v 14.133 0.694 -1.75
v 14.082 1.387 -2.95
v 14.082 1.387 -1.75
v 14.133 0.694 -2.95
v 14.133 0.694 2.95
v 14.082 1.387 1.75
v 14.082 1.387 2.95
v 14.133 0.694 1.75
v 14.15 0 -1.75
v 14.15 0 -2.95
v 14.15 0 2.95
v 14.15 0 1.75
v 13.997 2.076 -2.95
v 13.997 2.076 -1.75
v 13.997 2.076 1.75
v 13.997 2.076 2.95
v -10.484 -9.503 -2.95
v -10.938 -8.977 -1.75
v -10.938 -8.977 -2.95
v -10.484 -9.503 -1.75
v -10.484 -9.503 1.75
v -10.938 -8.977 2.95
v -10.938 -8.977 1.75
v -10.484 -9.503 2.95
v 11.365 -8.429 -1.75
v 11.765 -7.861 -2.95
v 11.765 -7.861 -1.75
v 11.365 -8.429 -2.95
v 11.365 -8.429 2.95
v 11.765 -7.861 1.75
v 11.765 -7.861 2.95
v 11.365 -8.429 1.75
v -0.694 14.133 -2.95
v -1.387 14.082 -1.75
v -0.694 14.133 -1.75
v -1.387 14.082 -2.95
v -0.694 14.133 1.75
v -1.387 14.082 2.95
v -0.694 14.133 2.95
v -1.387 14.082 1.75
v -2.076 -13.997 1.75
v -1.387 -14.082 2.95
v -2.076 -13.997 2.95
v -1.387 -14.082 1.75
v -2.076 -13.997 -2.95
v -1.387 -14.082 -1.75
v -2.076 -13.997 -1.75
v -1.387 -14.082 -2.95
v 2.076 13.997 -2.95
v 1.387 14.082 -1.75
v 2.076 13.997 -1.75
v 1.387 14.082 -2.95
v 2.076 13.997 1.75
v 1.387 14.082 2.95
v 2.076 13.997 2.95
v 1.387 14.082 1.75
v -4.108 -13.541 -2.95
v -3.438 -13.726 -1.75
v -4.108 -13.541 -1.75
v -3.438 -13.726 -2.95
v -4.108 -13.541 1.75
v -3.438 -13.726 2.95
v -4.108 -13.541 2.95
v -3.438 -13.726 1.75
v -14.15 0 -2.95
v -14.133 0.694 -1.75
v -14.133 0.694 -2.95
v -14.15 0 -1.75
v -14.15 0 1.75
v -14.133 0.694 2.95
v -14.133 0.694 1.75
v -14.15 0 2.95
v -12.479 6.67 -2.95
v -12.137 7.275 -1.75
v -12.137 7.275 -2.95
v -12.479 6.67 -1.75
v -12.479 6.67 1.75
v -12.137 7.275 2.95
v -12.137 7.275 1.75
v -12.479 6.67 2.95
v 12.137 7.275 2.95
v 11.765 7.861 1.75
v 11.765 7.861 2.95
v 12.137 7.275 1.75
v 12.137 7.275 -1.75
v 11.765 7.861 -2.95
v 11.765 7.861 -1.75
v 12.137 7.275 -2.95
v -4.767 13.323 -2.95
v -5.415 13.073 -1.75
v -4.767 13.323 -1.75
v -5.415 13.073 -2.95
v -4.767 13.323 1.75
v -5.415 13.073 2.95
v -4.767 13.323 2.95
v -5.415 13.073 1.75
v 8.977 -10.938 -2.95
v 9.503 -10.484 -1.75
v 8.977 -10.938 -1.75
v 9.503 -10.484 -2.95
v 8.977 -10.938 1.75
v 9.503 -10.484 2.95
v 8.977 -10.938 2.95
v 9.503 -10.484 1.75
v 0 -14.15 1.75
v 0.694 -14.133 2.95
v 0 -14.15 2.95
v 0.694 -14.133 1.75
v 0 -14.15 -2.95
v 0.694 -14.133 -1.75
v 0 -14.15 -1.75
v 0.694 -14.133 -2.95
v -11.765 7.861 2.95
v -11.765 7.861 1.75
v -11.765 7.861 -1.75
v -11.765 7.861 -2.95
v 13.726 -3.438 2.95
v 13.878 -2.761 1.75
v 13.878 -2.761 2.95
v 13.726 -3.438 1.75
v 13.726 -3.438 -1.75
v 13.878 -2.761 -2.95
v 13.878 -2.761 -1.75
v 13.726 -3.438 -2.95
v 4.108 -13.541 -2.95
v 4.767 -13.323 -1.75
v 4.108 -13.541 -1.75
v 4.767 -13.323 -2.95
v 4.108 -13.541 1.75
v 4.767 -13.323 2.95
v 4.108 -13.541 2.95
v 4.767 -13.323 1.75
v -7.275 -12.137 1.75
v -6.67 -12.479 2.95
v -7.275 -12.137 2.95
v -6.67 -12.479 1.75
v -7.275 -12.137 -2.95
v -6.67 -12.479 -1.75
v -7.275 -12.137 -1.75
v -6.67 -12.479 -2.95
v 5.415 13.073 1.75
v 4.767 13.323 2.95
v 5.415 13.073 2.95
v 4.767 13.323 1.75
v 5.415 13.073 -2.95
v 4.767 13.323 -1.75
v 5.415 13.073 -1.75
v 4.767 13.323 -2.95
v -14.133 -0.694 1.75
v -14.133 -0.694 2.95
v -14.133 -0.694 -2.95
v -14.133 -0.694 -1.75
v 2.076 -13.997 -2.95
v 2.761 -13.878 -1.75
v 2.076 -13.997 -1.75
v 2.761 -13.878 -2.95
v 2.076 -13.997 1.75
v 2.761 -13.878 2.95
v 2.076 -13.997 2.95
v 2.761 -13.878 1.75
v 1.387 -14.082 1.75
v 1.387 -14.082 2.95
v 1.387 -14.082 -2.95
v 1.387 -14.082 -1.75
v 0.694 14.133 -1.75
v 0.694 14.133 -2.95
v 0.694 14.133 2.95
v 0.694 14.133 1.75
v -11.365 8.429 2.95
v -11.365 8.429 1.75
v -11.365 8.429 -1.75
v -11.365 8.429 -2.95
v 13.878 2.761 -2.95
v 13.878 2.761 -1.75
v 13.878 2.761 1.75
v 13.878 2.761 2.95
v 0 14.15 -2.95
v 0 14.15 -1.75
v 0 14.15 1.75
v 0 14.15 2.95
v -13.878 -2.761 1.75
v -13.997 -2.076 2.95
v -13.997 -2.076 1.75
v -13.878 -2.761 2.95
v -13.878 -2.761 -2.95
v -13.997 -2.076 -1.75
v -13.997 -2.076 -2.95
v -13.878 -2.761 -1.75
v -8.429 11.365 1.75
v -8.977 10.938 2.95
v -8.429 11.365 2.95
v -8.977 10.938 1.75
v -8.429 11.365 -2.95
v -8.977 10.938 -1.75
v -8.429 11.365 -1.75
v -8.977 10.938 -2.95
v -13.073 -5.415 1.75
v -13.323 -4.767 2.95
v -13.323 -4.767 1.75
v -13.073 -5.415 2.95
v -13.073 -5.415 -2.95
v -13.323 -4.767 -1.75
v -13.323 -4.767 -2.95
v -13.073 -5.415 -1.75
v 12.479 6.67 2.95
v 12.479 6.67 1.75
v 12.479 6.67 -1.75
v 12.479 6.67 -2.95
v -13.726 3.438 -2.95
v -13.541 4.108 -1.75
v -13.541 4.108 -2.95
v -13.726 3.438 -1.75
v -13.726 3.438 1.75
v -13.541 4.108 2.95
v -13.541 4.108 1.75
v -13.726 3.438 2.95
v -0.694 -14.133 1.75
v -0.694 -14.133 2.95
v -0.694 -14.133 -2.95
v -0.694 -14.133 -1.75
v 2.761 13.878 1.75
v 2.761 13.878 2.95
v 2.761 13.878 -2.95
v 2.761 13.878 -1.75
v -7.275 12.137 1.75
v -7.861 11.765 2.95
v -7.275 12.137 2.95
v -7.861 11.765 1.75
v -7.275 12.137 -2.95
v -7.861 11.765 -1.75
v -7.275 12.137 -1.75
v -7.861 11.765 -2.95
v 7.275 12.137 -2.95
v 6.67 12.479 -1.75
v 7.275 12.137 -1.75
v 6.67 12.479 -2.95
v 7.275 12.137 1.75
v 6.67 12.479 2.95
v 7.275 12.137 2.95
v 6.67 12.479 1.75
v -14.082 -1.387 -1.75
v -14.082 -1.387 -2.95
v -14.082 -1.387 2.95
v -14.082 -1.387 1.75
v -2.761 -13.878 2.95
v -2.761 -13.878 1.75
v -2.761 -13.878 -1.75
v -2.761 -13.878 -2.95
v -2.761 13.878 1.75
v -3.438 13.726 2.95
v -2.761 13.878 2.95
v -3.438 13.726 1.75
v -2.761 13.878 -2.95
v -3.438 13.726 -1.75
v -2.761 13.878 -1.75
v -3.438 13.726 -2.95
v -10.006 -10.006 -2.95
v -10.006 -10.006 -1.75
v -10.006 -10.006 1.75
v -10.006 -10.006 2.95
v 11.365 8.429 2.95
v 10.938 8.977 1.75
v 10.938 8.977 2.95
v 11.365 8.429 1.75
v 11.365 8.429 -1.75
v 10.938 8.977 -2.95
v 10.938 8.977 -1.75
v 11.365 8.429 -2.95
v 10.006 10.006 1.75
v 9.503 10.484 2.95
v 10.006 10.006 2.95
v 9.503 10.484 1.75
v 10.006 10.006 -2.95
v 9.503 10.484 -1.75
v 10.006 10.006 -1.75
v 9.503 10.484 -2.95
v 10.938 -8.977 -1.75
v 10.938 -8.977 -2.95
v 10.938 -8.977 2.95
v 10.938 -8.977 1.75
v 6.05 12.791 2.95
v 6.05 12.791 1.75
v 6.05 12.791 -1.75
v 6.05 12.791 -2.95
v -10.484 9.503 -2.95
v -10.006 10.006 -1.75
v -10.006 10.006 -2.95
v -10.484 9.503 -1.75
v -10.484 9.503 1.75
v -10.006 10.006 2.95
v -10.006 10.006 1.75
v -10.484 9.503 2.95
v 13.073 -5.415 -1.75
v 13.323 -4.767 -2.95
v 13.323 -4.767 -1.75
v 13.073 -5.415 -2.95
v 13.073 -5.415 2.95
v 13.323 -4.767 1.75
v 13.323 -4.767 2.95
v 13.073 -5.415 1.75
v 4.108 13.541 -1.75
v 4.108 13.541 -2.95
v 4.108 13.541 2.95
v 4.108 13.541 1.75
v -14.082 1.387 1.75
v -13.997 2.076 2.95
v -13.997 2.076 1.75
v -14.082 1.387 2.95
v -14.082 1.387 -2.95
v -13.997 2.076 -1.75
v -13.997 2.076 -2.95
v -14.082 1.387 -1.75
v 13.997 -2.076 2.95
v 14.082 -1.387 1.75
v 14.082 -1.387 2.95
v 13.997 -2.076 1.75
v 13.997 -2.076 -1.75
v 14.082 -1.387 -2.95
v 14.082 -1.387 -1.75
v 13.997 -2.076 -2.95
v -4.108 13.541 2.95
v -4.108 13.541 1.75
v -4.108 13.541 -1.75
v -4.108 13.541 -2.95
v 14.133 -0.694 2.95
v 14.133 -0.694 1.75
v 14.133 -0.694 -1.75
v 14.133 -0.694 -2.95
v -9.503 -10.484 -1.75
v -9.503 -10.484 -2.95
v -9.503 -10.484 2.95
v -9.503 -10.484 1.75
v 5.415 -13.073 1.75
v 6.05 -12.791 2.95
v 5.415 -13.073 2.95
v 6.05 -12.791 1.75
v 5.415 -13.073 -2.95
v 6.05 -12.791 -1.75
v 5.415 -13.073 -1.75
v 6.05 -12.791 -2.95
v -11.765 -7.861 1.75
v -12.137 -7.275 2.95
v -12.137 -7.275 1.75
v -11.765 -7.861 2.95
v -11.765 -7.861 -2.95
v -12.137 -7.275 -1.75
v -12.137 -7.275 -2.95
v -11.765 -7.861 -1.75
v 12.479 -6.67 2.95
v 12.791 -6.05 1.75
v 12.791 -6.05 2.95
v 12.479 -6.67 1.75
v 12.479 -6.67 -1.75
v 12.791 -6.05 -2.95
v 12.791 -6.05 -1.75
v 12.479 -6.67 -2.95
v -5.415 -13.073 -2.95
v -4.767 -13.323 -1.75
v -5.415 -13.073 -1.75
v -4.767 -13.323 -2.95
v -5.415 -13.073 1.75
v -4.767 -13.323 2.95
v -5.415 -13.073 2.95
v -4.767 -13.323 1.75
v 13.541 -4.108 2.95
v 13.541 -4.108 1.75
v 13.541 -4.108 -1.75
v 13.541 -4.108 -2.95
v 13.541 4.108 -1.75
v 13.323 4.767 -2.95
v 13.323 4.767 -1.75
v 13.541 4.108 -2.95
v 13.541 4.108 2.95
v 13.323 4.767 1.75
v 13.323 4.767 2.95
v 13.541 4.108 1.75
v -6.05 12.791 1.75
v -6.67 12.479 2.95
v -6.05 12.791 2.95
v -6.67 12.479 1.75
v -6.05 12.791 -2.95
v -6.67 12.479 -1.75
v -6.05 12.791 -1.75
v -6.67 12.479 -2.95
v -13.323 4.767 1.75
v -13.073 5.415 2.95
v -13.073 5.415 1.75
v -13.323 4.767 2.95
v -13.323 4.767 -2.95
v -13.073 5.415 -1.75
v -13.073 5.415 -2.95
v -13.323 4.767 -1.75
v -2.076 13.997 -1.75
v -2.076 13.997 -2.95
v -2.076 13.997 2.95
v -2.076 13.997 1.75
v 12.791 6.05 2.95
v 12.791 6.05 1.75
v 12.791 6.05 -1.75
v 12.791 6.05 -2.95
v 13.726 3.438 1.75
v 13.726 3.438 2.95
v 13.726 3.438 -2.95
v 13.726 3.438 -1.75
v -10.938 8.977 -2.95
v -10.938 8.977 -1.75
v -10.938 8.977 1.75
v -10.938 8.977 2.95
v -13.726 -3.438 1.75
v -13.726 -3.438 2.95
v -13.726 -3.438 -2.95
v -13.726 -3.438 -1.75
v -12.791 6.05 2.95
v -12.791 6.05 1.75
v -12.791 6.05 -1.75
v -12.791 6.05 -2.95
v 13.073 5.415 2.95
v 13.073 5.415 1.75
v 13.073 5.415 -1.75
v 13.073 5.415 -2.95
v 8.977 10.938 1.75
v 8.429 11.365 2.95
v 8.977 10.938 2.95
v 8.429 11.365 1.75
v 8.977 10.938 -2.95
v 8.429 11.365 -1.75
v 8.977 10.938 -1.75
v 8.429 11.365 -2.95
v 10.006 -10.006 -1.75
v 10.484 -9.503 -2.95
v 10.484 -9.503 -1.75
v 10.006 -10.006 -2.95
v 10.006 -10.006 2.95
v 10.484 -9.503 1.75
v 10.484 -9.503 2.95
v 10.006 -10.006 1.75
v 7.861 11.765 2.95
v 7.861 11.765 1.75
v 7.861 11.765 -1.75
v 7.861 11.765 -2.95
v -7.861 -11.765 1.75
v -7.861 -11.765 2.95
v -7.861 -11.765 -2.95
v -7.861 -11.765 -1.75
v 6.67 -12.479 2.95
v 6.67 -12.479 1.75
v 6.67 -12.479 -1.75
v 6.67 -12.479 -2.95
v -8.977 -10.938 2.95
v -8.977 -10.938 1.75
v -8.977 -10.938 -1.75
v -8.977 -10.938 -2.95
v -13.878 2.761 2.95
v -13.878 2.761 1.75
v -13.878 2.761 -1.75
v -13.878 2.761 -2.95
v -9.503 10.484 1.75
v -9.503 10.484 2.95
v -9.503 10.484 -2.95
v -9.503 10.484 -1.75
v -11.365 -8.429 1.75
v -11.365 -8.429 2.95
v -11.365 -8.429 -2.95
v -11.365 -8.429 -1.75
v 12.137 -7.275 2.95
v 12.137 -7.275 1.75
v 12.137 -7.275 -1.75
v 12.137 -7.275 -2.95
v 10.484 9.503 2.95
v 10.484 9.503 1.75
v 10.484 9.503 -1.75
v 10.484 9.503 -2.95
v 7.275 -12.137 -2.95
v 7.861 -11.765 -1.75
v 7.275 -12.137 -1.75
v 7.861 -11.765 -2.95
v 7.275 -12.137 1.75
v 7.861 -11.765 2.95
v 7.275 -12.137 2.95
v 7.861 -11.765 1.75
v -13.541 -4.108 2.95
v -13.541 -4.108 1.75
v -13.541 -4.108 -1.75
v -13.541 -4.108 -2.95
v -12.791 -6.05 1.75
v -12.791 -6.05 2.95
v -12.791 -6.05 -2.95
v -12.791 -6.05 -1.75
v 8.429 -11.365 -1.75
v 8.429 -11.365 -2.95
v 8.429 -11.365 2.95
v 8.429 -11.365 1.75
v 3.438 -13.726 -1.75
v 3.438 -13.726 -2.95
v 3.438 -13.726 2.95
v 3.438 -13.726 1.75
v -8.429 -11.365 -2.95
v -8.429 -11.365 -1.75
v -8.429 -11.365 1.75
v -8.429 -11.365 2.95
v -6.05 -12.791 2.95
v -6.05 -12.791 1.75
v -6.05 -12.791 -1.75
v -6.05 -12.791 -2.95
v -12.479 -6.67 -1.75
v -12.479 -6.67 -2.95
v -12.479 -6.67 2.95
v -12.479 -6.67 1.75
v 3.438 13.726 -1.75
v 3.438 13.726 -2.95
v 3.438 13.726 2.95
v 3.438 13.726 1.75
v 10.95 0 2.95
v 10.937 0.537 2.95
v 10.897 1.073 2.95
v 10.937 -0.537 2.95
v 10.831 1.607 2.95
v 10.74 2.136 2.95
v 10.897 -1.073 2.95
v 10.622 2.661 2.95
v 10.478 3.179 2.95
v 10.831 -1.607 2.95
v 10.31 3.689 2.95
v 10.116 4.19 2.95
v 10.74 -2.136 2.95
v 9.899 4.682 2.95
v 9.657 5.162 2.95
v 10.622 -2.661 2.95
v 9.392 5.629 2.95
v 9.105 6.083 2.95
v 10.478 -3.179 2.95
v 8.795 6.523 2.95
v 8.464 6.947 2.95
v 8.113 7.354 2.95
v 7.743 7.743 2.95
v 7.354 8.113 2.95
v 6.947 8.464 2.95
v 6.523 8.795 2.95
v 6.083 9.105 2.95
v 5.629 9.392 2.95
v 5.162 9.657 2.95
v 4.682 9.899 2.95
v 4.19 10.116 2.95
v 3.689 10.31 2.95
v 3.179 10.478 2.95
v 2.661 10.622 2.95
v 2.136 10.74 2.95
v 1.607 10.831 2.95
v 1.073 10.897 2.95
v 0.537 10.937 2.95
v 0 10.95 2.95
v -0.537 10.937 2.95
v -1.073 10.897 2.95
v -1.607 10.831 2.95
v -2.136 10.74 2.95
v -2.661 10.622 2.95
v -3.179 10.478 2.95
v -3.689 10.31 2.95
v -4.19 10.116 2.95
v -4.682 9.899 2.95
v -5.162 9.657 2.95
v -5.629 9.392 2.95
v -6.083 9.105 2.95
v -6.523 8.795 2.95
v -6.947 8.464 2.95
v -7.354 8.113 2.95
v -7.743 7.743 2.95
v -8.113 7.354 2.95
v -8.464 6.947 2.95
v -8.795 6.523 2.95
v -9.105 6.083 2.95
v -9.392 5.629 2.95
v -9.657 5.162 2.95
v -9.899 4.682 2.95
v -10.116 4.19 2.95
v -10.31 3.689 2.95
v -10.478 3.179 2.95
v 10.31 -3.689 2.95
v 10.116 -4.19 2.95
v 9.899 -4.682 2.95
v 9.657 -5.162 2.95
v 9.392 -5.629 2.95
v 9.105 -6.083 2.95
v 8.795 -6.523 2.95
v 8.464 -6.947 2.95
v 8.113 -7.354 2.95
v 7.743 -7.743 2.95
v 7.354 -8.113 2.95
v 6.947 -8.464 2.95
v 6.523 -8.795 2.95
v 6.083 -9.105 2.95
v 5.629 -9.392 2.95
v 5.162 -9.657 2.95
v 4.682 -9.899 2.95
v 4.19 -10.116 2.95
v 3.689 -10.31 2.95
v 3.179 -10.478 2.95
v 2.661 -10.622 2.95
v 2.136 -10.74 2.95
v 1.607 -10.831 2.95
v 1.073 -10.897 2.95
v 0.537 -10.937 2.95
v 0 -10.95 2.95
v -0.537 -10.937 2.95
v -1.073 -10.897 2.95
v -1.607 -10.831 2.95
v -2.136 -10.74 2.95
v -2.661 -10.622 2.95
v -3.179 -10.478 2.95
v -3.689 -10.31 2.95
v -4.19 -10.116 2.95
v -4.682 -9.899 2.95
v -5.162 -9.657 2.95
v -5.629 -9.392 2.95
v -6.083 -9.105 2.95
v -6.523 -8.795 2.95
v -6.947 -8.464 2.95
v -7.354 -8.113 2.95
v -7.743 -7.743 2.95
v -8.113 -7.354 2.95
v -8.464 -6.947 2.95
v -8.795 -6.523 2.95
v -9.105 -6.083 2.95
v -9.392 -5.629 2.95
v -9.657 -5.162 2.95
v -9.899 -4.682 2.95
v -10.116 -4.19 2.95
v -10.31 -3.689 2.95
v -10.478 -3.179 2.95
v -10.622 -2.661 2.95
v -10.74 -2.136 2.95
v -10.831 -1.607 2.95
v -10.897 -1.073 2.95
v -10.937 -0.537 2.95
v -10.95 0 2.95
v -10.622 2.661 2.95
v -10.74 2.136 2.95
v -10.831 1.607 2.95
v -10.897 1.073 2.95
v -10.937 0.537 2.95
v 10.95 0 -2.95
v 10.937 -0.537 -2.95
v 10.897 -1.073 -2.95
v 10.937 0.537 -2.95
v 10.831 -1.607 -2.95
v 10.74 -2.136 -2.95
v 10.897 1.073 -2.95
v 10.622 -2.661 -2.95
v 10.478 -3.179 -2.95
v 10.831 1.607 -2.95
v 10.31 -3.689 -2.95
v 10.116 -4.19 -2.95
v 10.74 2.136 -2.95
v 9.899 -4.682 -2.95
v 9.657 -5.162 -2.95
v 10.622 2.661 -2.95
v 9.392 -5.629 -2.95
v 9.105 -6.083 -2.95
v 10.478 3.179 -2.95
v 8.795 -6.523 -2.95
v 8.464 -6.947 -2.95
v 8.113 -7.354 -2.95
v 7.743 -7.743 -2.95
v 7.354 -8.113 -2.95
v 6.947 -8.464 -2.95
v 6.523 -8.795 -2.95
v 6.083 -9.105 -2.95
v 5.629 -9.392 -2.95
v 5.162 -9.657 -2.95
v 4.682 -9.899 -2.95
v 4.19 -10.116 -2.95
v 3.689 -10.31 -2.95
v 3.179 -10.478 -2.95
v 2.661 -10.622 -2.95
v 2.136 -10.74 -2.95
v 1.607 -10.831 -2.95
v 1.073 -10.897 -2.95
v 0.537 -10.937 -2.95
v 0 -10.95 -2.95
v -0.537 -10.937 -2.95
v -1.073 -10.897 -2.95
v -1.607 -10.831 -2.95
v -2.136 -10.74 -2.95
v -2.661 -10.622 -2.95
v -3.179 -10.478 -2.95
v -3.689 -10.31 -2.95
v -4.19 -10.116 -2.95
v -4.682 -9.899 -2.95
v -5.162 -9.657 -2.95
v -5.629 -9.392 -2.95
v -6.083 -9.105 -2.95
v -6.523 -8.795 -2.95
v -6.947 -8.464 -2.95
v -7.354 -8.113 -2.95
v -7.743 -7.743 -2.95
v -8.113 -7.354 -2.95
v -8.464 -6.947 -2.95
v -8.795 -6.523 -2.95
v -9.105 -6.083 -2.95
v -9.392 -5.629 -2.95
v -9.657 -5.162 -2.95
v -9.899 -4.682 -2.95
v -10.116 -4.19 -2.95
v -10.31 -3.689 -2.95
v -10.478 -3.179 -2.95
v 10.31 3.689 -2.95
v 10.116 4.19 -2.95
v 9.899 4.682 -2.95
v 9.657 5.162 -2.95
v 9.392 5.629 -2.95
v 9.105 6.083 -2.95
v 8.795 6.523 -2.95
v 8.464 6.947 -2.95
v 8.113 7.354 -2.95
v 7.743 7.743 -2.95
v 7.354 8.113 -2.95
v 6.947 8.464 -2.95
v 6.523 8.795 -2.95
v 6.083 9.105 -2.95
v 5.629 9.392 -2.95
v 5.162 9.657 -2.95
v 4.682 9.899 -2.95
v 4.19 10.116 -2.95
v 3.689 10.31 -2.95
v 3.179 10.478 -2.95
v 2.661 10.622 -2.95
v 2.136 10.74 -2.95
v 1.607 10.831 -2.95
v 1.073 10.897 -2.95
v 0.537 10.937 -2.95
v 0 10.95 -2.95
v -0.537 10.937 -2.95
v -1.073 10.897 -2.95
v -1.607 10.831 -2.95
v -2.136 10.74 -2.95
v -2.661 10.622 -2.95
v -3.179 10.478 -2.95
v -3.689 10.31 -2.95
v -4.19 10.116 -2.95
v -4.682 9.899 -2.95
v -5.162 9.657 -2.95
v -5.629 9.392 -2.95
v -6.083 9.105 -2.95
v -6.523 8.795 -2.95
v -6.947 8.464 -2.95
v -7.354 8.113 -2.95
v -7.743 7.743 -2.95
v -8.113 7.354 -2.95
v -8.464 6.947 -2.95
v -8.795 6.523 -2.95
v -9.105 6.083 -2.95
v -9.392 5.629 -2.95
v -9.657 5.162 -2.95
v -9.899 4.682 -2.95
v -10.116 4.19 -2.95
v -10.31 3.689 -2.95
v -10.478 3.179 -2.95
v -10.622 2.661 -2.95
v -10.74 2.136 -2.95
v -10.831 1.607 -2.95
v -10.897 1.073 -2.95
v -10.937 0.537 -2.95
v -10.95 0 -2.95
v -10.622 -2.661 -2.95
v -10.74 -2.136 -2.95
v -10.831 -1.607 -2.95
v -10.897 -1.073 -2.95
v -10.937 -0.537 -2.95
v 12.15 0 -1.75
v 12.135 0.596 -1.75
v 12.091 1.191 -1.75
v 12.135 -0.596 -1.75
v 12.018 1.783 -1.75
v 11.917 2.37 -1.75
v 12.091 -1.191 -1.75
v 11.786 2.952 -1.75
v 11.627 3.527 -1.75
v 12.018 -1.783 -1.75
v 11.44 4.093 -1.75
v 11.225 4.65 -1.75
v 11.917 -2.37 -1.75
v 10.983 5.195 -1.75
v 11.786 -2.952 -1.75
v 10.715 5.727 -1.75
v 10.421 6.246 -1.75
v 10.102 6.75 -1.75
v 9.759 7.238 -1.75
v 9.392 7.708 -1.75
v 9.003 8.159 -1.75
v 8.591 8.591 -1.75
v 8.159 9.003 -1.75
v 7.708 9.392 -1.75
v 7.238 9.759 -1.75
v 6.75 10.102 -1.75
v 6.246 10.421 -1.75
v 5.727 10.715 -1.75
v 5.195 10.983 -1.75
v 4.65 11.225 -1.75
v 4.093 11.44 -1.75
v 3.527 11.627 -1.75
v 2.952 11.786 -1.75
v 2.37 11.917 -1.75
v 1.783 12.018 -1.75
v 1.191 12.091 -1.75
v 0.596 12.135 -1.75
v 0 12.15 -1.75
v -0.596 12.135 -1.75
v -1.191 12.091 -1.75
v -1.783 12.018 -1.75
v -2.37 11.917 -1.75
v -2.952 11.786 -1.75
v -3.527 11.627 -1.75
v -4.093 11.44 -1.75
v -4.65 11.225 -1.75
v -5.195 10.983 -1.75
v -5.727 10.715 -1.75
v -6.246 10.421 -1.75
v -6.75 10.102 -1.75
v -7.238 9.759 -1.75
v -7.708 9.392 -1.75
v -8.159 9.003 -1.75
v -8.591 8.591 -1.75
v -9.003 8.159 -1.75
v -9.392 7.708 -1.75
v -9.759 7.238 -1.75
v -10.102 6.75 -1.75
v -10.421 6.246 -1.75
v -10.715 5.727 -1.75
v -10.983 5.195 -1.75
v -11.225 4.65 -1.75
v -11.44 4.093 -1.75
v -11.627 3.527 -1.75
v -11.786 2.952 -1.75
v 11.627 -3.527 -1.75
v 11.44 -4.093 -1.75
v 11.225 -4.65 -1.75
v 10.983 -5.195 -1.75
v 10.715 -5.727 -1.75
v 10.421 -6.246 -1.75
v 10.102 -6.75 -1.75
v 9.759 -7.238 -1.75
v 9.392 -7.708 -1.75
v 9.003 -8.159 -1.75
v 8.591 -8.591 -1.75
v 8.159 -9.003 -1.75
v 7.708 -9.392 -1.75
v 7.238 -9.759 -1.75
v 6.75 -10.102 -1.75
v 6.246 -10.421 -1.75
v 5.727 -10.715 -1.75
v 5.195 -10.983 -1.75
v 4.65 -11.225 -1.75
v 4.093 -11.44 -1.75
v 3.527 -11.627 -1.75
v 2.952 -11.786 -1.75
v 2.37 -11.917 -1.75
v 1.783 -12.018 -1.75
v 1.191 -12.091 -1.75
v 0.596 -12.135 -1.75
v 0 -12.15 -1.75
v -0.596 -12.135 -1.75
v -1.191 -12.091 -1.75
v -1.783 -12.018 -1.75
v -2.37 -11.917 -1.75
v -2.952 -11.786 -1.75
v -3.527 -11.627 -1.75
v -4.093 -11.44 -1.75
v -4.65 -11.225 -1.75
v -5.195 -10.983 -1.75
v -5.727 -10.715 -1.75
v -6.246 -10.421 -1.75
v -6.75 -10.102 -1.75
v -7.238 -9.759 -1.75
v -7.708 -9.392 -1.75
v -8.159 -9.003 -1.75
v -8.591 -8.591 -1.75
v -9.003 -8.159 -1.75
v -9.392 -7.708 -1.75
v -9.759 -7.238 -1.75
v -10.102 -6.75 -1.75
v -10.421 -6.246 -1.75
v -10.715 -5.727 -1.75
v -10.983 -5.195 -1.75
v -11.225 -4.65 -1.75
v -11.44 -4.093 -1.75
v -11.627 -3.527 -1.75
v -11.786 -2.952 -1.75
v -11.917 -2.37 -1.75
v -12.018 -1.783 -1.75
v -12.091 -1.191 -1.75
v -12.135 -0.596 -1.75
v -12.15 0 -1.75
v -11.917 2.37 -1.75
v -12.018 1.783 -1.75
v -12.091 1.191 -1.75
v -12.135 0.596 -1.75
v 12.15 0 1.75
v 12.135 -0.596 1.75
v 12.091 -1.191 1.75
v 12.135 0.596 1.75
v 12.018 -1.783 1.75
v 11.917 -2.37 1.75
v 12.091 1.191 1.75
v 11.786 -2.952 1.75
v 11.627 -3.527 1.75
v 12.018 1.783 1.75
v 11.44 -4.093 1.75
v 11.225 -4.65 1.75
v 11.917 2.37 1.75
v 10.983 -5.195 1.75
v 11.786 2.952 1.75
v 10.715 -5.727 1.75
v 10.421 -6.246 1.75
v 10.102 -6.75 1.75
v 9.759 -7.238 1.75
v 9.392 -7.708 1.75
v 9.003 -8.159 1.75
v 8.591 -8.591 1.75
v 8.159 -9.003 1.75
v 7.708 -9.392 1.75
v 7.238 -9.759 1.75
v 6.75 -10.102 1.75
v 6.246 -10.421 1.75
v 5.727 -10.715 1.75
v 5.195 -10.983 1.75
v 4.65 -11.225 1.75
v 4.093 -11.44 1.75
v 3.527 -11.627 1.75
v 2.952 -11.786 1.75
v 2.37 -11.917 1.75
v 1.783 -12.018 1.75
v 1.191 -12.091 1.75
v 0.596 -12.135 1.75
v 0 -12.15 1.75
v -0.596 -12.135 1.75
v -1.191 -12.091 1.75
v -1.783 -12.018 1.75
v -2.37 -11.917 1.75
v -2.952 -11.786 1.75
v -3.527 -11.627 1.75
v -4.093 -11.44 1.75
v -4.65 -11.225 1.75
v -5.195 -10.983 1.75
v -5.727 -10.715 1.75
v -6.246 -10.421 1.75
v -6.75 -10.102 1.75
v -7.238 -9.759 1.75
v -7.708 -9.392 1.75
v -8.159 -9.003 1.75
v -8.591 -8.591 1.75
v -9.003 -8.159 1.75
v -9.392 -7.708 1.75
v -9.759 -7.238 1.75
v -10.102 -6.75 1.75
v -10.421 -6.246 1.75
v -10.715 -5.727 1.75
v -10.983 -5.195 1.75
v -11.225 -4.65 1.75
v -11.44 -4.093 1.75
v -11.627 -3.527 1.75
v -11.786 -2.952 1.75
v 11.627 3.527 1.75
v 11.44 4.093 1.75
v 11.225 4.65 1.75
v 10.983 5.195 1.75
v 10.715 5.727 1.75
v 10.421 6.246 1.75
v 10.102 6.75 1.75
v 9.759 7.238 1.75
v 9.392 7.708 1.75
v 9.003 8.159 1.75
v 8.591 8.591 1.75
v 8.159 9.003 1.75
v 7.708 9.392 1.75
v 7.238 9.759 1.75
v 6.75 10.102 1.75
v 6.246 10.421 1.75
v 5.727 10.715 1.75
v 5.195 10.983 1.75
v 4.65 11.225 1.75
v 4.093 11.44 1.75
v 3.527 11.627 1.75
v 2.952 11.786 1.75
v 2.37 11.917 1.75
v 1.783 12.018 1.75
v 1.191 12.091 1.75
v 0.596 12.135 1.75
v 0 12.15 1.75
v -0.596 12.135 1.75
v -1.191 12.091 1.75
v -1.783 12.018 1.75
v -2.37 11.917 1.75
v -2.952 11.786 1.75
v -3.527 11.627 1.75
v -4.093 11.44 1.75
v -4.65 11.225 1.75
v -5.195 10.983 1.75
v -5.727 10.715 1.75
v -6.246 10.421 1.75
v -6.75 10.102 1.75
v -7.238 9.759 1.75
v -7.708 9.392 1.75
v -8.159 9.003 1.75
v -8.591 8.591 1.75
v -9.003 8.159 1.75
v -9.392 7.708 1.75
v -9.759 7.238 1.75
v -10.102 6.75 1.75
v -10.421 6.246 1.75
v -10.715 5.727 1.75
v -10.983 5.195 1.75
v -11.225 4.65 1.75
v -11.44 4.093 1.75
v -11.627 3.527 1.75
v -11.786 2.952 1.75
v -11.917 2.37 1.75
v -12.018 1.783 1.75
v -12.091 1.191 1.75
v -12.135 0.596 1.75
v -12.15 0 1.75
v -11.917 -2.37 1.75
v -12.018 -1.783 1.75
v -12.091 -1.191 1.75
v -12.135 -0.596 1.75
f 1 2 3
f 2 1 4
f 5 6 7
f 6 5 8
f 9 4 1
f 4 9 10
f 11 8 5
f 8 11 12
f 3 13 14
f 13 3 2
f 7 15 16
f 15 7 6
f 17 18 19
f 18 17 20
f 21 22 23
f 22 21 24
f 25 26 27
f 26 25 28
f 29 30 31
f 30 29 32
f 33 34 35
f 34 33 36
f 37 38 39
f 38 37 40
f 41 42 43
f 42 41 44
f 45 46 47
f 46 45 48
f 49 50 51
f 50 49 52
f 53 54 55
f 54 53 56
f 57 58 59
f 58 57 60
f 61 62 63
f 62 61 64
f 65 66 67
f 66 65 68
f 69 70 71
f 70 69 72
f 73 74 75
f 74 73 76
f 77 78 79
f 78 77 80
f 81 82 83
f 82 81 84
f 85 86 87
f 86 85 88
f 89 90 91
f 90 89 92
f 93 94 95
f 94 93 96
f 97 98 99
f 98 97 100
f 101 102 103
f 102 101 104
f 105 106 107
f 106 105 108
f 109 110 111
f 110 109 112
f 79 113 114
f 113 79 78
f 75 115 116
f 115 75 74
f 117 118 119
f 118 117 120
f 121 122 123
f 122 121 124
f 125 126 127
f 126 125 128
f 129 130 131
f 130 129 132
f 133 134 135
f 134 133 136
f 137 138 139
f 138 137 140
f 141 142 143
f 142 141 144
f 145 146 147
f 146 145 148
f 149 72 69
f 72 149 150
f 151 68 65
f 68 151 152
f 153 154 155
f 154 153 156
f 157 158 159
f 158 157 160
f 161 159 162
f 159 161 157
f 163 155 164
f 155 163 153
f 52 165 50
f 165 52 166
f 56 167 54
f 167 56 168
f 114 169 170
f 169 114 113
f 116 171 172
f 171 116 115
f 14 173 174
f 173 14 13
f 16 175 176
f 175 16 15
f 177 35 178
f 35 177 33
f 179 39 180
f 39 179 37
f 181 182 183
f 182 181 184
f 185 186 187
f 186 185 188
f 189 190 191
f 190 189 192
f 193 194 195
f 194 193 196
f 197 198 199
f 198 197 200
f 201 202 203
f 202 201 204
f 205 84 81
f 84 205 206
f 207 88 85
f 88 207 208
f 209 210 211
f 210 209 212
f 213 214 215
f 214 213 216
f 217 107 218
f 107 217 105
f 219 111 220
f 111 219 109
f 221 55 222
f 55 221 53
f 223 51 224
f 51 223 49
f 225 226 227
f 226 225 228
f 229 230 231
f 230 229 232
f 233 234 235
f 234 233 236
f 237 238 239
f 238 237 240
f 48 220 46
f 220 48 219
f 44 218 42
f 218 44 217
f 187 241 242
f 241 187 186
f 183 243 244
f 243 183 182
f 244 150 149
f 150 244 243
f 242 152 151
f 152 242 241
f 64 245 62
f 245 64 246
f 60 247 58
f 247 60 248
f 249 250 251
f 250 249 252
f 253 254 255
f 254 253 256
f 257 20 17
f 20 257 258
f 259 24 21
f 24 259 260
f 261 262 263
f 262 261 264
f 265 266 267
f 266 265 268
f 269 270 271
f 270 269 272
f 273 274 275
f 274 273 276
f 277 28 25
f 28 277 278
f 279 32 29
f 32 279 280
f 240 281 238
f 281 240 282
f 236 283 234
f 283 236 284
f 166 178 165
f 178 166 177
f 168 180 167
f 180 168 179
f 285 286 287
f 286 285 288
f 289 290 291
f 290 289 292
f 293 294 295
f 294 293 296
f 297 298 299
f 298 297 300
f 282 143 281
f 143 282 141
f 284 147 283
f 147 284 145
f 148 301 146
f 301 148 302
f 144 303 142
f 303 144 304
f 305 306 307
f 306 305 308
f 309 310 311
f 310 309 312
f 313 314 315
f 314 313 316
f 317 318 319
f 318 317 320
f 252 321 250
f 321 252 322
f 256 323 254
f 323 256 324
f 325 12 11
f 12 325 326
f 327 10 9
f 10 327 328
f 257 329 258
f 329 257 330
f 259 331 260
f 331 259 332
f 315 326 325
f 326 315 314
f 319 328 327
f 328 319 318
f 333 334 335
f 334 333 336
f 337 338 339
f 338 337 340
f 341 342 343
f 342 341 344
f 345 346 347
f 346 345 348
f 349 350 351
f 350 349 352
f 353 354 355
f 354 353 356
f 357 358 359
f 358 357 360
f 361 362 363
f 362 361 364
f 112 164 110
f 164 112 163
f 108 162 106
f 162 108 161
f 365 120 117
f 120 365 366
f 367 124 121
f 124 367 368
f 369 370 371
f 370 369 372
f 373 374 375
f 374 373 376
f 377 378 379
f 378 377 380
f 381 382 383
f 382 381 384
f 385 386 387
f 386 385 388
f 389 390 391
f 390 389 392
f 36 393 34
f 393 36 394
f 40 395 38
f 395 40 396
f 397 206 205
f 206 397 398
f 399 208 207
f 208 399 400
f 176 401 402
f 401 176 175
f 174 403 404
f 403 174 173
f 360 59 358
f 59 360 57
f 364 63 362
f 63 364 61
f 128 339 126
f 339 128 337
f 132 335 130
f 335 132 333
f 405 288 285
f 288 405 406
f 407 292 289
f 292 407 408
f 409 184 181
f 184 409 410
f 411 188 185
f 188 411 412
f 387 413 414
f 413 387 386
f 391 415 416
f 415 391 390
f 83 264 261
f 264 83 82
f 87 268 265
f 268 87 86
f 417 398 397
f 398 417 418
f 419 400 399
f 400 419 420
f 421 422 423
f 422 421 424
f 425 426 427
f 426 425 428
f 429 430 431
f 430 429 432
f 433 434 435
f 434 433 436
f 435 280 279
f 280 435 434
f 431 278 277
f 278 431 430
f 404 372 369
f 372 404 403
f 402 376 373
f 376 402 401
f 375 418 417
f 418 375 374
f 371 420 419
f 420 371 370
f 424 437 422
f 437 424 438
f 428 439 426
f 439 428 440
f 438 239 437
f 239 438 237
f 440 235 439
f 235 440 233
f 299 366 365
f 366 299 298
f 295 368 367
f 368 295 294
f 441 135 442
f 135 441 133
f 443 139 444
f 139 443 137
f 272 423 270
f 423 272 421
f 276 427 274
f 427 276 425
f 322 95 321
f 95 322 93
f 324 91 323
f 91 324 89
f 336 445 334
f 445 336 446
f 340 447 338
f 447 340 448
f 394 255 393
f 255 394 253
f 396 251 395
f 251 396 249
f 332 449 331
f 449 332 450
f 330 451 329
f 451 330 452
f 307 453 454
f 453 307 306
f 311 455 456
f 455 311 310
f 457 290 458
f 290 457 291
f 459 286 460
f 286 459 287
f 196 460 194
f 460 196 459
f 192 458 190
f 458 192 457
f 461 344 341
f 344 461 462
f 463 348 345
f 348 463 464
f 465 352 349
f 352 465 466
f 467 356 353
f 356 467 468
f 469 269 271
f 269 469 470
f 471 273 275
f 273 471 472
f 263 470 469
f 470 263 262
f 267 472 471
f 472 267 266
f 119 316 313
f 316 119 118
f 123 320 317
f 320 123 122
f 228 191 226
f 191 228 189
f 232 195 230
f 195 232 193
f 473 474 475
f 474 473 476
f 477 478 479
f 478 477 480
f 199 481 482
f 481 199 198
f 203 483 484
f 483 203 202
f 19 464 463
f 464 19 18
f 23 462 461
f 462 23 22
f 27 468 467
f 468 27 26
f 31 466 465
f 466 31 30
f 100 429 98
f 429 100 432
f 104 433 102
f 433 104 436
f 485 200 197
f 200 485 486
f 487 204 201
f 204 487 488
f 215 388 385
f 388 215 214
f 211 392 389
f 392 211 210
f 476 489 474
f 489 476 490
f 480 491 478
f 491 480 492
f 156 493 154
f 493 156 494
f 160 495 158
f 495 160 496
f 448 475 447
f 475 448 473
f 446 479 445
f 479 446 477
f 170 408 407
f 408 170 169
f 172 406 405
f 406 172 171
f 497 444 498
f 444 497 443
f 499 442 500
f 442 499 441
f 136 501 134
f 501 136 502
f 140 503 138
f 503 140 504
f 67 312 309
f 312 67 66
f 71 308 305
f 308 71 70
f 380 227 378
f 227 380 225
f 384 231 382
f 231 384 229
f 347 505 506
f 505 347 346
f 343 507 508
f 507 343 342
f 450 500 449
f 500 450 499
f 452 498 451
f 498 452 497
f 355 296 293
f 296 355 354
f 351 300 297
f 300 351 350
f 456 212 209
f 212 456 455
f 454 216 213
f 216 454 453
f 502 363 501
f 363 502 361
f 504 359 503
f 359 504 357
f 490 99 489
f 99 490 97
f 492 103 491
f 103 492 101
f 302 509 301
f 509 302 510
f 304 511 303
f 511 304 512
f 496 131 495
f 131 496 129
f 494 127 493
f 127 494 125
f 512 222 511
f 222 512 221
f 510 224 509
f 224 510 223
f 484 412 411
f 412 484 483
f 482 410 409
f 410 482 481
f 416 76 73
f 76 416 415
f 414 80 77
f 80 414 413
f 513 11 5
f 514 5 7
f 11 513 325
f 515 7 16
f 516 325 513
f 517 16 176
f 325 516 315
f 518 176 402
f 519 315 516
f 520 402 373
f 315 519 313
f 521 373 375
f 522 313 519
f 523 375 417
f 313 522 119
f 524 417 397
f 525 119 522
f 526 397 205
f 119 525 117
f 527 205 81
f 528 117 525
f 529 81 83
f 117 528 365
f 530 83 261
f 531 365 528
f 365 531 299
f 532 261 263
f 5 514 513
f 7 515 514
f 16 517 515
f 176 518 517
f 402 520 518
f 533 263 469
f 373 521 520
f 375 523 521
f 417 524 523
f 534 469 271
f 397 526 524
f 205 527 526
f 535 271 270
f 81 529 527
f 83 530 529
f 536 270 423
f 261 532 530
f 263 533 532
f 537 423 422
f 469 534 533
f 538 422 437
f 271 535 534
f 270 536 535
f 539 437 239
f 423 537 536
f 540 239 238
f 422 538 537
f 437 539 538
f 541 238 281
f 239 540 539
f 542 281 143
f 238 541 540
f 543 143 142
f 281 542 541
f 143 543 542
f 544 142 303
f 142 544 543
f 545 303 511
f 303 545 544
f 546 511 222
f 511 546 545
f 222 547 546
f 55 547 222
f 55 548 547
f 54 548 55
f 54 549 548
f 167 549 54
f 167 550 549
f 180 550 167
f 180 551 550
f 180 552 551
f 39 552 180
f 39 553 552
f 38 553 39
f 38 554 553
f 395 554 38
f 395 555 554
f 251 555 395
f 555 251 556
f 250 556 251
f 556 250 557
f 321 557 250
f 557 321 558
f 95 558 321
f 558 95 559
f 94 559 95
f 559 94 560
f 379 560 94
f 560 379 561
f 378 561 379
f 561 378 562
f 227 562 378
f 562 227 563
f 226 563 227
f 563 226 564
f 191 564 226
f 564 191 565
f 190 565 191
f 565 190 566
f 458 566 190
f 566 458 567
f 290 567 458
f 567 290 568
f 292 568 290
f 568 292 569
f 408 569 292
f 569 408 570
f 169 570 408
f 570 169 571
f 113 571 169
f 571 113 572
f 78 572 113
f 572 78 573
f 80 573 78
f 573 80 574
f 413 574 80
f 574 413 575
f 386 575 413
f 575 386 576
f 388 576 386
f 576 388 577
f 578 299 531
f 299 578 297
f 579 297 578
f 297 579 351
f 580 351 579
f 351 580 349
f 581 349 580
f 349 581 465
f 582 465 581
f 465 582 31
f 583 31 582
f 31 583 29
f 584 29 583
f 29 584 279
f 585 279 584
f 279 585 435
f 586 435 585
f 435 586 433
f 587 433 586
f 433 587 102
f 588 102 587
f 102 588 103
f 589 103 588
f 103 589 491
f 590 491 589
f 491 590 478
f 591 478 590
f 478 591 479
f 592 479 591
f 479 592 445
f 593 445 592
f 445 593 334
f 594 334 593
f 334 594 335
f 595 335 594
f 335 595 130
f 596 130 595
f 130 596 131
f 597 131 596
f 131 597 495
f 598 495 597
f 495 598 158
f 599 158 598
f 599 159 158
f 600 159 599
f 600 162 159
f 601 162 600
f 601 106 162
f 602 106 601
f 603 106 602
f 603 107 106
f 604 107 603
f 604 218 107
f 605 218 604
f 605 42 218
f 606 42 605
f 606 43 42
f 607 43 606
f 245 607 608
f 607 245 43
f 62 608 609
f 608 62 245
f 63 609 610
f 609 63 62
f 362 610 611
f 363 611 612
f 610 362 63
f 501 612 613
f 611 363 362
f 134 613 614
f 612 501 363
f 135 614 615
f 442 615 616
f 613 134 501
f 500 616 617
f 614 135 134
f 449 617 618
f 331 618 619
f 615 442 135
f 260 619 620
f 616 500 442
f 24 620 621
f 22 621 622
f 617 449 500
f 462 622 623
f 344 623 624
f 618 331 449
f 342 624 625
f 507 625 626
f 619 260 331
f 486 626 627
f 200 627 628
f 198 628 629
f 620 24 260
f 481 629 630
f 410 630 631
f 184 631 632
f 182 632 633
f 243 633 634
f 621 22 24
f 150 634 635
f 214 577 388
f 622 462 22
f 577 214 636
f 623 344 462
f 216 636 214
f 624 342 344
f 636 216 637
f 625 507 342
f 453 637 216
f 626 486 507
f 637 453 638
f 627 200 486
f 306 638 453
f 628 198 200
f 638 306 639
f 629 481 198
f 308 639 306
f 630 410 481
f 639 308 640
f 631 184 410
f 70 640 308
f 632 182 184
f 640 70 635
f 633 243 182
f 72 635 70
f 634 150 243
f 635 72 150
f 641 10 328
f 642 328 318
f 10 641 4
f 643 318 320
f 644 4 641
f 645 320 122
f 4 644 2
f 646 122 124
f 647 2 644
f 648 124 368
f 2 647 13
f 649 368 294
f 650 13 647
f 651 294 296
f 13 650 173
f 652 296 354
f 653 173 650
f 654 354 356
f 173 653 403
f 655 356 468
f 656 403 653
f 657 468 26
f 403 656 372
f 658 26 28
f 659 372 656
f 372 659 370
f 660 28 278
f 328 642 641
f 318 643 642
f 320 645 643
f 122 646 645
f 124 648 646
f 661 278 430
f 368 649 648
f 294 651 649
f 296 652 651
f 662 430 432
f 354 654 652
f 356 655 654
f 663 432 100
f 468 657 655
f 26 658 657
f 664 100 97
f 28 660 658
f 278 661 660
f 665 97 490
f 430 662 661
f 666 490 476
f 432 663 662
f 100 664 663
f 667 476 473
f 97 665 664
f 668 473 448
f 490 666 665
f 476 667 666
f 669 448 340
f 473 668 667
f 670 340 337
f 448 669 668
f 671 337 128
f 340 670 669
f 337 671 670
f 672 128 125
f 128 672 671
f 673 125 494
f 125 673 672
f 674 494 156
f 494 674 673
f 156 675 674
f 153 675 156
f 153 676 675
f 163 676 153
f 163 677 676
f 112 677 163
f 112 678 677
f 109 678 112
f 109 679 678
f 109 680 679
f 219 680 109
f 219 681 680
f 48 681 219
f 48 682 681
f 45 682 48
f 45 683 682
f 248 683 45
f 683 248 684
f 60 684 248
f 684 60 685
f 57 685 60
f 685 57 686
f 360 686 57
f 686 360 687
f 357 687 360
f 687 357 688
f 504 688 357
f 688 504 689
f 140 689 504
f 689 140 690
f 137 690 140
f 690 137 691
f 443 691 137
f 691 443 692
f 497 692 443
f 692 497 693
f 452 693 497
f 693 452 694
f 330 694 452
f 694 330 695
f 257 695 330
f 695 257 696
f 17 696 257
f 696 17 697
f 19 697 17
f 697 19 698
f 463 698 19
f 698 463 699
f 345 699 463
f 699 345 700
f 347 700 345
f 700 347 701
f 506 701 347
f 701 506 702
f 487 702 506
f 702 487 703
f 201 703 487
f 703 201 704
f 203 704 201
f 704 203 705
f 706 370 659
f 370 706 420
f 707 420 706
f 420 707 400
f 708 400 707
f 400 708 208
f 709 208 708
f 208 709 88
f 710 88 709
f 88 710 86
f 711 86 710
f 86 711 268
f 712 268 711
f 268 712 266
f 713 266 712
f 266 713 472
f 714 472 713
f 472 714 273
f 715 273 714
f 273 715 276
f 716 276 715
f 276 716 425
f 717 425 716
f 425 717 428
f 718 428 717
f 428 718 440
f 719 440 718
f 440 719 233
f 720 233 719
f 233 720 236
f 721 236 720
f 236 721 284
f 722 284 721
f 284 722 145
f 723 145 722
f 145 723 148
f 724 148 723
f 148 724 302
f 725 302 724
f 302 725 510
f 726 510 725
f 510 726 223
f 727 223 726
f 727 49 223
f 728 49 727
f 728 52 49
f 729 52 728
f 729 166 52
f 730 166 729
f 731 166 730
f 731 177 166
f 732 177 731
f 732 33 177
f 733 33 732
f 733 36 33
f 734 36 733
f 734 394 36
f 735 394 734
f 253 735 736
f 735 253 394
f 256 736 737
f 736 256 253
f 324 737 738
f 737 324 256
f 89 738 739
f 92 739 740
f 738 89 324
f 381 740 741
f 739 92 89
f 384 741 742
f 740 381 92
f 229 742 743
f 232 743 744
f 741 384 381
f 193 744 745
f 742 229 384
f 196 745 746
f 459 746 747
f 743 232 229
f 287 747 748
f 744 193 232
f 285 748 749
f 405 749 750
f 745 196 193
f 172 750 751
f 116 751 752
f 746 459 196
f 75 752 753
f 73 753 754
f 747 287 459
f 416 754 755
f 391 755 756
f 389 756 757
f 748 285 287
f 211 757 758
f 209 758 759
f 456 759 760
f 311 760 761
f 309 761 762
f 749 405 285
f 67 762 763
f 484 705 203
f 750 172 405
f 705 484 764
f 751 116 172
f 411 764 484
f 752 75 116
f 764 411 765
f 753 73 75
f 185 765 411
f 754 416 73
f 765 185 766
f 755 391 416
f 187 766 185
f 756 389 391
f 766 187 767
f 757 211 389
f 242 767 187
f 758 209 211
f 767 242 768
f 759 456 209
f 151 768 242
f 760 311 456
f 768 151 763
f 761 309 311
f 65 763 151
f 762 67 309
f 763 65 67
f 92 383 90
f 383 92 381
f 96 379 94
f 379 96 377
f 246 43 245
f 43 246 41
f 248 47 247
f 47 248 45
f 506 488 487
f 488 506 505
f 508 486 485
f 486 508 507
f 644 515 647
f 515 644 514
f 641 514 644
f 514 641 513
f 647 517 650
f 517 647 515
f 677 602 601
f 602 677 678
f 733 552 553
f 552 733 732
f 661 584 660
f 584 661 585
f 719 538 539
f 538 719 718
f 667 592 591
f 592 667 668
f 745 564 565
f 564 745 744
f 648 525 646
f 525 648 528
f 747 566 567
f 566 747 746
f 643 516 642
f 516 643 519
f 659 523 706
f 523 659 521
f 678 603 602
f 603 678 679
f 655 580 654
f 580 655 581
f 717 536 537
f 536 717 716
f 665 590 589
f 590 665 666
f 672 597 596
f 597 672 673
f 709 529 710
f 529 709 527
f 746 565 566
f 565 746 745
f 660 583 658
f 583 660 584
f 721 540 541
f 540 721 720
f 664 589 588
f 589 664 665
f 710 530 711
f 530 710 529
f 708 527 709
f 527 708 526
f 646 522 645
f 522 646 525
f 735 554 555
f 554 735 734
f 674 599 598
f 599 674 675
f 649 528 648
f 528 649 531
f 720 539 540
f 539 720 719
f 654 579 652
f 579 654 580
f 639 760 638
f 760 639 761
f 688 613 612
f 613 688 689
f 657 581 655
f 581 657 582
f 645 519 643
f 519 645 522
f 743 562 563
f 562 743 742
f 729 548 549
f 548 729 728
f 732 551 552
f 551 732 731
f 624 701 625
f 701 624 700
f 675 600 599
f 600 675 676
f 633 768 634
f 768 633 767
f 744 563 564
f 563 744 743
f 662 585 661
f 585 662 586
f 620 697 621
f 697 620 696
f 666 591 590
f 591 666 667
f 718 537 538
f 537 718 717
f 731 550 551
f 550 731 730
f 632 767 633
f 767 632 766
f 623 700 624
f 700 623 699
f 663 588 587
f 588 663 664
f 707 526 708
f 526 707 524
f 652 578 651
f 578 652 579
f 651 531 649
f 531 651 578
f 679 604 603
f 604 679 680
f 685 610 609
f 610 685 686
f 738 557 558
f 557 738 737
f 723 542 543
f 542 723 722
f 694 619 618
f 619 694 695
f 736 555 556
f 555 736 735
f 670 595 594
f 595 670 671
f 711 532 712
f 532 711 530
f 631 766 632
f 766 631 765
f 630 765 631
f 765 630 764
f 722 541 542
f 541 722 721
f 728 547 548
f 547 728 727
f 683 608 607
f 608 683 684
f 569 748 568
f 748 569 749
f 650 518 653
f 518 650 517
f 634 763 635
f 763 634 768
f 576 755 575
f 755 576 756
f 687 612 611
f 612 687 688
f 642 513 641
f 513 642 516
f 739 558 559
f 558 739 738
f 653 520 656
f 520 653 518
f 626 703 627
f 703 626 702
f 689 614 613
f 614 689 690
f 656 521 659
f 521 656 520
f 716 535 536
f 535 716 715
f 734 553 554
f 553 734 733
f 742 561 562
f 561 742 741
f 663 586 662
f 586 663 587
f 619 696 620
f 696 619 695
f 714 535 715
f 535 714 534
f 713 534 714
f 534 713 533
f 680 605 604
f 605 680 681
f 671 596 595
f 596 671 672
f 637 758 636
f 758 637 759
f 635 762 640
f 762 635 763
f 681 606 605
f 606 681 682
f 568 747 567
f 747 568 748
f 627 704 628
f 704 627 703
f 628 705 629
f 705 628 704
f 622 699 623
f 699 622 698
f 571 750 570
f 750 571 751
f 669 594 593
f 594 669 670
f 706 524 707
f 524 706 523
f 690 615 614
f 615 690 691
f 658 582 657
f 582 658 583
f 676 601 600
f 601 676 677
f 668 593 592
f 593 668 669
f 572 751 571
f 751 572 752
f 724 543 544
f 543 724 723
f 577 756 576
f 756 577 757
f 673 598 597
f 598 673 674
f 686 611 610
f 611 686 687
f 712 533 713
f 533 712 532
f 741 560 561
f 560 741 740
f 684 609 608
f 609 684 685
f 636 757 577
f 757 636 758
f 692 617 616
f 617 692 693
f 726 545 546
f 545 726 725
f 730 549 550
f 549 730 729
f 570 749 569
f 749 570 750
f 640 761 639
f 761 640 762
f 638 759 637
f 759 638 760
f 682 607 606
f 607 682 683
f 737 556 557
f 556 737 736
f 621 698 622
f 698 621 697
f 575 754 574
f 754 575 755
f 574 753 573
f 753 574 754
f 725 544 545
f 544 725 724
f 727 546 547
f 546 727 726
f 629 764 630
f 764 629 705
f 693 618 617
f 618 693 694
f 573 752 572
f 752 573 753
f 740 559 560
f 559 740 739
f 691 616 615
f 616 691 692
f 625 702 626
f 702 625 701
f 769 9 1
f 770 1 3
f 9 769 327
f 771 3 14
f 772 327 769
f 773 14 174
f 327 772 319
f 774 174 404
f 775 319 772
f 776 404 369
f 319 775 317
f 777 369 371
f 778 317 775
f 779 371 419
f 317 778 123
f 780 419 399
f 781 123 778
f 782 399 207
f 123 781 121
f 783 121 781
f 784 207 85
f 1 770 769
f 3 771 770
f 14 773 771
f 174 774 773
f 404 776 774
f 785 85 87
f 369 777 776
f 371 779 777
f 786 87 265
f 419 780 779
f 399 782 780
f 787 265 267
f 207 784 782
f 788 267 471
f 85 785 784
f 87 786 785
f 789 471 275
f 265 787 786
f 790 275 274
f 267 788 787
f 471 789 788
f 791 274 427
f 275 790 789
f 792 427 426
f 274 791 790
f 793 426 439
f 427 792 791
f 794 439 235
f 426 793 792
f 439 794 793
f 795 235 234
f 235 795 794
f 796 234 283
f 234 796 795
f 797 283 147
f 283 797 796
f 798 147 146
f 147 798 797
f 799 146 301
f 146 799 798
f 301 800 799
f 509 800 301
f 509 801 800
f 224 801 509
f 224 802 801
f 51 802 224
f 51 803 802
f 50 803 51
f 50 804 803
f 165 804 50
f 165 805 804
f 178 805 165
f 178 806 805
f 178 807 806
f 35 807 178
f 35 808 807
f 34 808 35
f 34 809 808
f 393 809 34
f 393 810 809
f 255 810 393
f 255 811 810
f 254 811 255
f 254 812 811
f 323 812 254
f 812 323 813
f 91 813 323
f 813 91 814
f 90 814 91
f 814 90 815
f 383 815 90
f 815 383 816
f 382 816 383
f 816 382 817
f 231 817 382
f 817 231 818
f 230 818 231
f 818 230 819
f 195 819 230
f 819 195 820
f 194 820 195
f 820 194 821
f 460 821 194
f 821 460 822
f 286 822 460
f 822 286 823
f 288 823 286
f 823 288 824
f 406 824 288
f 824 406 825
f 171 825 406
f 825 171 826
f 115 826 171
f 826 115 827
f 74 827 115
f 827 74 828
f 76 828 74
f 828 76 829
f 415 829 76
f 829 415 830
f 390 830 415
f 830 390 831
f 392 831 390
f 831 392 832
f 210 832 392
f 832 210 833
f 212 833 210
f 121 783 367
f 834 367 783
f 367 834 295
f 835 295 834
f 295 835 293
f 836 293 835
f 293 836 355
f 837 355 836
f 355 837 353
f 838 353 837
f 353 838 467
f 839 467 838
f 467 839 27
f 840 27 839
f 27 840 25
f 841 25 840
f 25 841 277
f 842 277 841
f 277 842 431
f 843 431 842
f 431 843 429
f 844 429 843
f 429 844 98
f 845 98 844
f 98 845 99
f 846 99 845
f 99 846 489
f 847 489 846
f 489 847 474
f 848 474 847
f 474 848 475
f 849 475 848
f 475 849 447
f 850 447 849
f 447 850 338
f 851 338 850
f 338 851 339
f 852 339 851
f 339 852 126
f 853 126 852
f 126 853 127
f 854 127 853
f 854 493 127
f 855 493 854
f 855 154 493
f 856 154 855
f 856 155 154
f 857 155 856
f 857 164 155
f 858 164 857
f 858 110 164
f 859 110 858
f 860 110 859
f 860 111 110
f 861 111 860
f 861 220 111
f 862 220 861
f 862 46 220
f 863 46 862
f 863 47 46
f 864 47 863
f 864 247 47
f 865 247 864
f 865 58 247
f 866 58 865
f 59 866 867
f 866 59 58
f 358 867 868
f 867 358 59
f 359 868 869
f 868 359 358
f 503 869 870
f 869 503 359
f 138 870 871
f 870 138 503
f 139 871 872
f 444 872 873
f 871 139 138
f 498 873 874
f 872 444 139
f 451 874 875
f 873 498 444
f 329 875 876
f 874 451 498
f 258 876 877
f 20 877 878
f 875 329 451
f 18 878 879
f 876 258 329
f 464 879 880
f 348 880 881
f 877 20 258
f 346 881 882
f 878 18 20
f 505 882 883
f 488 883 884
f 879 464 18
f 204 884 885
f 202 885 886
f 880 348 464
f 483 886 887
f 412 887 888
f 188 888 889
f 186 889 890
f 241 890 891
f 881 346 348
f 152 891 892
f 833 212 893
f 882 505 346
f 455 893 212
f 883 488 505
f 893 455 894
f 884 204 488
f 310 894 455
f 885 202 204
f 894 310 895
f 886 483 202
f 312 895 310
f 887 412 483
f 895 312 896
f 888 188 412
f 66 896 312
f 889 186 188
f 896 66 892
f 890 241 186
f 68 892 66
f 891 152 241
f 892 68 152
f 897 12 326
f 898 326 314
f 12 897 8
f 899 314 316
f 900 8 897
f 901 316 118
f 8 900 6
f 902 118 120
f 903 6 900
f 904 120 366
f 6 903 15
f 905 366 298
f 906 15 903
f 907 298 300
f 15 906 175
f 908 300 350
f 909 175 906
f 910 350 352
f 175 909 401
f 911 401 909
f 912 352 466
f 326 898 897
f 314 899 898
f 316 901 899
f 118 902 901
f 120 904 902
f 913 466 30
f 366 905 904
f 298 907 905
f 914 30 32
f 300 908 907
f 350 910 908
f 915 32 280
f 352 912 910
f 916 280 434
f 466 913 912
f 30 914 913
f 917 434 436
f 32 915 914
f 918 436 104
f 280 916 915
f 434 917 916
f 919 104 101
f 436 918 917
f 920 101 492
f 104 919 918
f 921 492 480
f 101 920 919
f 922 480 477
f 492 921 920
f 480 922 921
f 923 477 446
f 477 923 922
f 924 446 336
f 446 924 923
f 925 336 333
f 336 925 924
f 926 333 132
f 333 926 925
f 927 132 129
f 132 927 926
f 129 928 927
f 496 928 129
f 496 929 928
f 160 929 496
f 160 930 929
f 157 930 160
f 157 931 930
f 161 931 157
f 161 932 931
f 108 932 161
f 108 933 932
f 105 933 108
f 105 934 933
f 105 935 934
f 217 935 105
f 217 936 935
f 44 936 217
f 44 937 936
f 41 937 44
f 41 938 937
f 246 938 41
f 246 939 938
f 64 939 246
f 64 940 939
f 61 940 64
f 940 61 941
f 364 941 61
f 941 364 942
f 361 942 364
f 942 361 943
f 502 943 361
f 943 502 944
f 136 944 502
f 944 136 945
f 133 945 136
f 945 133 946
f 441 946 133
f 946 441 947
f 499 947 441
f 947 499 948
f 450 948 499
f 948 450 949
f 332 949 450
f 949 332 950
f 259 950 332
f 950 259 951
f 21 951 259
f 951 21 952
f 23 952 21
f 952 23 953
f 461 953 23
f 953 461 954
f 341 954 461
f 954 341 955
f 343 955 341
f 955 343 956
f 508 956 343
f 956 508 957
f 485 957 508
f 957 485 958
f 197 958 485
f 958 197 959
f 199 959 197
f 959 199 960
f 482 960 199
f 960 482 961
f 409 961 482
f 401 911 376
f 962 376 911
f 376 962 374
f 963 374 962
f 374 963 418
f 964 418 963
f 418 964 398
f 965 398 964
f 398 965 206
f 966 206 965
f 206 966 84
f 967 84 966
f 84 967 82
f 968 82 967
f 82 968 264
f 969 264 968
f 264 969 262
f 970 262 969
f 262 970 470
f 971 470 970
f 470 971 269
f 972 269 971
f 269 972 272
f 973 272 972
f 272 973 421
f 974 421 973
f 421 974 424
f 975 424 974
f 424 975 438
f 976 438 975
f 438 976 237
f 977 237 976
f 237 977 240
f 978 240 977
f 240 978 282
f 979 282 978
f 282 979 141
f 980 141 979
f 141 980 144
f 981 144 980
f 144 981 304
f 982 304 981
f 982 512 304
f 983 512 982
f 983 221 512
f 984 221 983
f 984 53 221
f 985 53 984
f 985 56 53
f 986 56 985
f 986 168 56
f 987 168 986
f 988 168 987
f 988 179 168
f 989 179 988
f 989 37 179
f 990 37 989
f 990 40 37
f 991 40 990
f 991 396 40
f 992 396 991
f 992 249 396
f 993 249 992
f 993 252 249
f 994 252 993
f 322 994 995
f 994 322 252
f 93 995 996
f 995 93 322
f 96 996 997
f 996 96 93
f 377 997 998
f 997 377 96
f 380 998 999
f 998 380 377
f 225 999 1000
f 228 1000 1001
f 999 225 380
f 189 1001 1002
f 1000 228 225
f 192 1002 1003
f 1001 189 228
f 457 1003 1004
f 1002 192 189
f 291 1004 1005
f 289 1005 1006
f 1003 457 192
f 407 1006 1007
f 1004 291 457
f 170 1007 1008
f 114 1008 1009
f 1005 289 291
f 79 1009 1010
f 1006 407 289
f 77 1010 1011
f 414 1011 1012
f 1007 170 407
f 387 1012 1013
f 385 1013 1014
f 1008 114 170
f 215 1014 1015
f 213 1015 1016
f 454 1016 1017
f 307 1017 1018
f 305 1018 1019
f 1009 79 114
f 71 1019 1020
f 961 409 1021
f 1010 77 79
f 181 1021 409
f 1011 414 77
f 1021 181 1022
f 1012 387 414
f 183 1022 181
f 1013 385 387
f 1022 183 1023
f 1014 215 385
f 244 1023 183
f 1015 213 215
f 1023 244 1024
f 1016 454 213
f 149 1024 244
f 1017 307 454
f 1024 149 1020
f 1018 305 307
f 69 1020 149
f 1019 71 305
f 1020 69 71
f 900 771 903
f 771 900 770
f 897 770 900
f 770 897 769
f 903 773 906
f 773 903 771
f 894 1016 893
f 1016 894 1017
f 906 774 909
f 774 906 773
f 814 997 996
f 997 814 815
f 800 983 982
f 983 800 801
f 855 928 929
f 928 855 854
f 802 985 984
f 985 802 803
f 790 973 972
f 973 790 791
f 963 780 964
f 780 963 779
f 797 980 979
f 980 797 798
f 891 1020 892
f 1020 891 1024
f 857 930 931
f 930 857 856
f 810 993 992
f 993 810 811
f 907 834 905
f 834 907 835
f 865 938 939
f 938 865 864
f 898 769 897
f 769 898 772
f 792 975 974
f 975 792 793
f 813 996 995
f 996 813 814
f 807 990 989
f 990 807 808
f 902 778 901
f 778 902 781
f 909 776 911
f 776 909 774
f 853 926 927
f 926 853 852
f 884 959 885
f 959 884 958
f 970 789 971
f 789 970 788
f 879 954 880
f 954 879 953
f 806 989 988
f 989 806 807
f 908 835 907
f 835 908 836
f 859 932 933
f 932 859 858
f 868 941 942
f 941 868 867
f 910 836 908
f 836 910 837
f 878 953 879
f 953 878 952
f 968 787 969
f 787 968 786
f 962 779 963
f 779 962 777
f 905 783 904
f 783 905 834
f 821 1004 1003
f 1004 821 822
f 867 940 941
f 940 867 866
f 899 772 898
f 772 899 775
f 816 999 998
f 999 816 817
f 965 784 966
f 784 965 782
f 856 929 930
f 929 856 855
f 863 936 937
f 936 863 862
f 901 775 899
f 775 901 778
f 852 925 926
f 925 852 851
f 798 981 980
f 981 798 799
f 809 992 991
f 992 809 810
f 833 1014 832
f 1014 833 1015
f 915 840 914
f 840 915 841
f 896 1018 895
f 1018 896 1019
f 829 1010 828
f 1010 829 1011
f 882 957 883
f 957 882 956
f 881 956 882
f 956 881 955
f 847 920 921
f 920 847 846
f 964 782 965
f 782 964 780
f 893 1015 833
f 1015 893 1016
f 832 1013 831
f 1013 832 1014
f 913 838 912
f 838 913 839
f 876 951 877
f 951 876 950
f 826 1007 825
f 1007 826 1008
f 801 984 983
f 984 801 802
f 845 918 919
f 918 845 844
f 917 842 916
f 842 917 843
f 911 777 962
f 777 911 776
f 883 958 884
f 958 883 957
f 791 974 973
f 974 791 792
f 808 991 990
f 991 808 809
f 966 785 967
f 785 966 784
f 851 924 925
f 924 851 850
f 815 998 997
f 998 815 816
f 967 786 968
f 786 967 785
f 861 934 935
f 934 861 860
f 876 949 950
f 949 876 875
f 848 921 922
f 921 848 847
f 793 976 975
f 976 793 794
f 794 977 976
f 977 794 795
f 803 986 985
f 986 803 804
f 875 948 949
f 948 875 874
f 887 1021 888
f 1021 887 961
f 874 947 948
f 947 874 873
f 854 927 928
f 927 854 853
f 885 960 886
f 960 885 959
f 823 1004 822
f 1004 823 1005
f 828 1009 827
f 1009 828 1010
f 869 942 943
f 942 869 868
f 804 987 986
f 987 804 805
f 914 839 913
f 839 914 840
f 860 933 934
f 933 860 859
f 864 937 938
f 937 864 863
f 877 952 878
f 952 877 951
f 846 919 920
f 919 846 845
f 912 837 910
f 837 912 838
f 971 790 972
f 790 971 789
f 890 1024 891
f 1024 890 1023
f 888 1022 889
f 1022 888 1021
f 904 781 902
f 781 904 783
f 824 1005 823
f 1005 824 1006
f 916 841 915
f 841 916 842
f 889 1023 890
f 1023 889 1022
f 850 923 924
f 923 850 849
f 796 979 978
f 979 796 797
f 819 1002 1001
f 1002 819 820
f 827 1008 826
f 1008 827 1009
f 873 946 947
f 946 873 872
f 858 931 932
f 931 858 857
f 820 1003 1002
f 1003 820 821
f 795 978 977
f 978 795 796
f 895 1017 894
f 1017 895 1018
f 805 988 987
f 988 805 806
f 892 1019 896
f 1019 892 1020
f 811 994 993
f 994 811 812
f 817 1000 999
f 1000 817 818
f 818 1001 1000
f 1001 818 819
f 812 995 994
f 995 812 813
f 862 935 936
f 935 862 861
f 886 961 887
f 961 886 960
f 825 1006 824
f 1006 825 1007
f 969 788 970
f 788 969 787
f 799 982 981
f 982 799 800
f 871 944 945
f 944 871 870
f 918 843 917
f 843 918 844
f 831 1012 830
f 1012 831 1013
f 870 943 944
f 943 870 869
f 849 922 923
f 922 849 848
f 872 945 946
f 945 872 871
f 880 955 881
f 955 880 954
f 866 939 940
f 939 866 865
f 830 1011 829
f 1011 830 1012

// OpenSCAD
$fn=128;
t = 1.2;
d0 = 24.3;
h_metal=3.5;
ring_width = 2;


module ring(h, d_outer, d_inner) {
    difference() {
        cylinder(h=h, d=d_outer, center=true);
        cylinder(h=h, d=d_inner, center=true);
    }
}


difference() {
    ring(h=h_metal + 2 * t, d_outer=d0 + 2 * ring_width, d_inner = d0 - 2 * t);
    ring(h=h_metal, d_outer = d0 + 2 * ring_width+0.1, d_inner = d0);
}
